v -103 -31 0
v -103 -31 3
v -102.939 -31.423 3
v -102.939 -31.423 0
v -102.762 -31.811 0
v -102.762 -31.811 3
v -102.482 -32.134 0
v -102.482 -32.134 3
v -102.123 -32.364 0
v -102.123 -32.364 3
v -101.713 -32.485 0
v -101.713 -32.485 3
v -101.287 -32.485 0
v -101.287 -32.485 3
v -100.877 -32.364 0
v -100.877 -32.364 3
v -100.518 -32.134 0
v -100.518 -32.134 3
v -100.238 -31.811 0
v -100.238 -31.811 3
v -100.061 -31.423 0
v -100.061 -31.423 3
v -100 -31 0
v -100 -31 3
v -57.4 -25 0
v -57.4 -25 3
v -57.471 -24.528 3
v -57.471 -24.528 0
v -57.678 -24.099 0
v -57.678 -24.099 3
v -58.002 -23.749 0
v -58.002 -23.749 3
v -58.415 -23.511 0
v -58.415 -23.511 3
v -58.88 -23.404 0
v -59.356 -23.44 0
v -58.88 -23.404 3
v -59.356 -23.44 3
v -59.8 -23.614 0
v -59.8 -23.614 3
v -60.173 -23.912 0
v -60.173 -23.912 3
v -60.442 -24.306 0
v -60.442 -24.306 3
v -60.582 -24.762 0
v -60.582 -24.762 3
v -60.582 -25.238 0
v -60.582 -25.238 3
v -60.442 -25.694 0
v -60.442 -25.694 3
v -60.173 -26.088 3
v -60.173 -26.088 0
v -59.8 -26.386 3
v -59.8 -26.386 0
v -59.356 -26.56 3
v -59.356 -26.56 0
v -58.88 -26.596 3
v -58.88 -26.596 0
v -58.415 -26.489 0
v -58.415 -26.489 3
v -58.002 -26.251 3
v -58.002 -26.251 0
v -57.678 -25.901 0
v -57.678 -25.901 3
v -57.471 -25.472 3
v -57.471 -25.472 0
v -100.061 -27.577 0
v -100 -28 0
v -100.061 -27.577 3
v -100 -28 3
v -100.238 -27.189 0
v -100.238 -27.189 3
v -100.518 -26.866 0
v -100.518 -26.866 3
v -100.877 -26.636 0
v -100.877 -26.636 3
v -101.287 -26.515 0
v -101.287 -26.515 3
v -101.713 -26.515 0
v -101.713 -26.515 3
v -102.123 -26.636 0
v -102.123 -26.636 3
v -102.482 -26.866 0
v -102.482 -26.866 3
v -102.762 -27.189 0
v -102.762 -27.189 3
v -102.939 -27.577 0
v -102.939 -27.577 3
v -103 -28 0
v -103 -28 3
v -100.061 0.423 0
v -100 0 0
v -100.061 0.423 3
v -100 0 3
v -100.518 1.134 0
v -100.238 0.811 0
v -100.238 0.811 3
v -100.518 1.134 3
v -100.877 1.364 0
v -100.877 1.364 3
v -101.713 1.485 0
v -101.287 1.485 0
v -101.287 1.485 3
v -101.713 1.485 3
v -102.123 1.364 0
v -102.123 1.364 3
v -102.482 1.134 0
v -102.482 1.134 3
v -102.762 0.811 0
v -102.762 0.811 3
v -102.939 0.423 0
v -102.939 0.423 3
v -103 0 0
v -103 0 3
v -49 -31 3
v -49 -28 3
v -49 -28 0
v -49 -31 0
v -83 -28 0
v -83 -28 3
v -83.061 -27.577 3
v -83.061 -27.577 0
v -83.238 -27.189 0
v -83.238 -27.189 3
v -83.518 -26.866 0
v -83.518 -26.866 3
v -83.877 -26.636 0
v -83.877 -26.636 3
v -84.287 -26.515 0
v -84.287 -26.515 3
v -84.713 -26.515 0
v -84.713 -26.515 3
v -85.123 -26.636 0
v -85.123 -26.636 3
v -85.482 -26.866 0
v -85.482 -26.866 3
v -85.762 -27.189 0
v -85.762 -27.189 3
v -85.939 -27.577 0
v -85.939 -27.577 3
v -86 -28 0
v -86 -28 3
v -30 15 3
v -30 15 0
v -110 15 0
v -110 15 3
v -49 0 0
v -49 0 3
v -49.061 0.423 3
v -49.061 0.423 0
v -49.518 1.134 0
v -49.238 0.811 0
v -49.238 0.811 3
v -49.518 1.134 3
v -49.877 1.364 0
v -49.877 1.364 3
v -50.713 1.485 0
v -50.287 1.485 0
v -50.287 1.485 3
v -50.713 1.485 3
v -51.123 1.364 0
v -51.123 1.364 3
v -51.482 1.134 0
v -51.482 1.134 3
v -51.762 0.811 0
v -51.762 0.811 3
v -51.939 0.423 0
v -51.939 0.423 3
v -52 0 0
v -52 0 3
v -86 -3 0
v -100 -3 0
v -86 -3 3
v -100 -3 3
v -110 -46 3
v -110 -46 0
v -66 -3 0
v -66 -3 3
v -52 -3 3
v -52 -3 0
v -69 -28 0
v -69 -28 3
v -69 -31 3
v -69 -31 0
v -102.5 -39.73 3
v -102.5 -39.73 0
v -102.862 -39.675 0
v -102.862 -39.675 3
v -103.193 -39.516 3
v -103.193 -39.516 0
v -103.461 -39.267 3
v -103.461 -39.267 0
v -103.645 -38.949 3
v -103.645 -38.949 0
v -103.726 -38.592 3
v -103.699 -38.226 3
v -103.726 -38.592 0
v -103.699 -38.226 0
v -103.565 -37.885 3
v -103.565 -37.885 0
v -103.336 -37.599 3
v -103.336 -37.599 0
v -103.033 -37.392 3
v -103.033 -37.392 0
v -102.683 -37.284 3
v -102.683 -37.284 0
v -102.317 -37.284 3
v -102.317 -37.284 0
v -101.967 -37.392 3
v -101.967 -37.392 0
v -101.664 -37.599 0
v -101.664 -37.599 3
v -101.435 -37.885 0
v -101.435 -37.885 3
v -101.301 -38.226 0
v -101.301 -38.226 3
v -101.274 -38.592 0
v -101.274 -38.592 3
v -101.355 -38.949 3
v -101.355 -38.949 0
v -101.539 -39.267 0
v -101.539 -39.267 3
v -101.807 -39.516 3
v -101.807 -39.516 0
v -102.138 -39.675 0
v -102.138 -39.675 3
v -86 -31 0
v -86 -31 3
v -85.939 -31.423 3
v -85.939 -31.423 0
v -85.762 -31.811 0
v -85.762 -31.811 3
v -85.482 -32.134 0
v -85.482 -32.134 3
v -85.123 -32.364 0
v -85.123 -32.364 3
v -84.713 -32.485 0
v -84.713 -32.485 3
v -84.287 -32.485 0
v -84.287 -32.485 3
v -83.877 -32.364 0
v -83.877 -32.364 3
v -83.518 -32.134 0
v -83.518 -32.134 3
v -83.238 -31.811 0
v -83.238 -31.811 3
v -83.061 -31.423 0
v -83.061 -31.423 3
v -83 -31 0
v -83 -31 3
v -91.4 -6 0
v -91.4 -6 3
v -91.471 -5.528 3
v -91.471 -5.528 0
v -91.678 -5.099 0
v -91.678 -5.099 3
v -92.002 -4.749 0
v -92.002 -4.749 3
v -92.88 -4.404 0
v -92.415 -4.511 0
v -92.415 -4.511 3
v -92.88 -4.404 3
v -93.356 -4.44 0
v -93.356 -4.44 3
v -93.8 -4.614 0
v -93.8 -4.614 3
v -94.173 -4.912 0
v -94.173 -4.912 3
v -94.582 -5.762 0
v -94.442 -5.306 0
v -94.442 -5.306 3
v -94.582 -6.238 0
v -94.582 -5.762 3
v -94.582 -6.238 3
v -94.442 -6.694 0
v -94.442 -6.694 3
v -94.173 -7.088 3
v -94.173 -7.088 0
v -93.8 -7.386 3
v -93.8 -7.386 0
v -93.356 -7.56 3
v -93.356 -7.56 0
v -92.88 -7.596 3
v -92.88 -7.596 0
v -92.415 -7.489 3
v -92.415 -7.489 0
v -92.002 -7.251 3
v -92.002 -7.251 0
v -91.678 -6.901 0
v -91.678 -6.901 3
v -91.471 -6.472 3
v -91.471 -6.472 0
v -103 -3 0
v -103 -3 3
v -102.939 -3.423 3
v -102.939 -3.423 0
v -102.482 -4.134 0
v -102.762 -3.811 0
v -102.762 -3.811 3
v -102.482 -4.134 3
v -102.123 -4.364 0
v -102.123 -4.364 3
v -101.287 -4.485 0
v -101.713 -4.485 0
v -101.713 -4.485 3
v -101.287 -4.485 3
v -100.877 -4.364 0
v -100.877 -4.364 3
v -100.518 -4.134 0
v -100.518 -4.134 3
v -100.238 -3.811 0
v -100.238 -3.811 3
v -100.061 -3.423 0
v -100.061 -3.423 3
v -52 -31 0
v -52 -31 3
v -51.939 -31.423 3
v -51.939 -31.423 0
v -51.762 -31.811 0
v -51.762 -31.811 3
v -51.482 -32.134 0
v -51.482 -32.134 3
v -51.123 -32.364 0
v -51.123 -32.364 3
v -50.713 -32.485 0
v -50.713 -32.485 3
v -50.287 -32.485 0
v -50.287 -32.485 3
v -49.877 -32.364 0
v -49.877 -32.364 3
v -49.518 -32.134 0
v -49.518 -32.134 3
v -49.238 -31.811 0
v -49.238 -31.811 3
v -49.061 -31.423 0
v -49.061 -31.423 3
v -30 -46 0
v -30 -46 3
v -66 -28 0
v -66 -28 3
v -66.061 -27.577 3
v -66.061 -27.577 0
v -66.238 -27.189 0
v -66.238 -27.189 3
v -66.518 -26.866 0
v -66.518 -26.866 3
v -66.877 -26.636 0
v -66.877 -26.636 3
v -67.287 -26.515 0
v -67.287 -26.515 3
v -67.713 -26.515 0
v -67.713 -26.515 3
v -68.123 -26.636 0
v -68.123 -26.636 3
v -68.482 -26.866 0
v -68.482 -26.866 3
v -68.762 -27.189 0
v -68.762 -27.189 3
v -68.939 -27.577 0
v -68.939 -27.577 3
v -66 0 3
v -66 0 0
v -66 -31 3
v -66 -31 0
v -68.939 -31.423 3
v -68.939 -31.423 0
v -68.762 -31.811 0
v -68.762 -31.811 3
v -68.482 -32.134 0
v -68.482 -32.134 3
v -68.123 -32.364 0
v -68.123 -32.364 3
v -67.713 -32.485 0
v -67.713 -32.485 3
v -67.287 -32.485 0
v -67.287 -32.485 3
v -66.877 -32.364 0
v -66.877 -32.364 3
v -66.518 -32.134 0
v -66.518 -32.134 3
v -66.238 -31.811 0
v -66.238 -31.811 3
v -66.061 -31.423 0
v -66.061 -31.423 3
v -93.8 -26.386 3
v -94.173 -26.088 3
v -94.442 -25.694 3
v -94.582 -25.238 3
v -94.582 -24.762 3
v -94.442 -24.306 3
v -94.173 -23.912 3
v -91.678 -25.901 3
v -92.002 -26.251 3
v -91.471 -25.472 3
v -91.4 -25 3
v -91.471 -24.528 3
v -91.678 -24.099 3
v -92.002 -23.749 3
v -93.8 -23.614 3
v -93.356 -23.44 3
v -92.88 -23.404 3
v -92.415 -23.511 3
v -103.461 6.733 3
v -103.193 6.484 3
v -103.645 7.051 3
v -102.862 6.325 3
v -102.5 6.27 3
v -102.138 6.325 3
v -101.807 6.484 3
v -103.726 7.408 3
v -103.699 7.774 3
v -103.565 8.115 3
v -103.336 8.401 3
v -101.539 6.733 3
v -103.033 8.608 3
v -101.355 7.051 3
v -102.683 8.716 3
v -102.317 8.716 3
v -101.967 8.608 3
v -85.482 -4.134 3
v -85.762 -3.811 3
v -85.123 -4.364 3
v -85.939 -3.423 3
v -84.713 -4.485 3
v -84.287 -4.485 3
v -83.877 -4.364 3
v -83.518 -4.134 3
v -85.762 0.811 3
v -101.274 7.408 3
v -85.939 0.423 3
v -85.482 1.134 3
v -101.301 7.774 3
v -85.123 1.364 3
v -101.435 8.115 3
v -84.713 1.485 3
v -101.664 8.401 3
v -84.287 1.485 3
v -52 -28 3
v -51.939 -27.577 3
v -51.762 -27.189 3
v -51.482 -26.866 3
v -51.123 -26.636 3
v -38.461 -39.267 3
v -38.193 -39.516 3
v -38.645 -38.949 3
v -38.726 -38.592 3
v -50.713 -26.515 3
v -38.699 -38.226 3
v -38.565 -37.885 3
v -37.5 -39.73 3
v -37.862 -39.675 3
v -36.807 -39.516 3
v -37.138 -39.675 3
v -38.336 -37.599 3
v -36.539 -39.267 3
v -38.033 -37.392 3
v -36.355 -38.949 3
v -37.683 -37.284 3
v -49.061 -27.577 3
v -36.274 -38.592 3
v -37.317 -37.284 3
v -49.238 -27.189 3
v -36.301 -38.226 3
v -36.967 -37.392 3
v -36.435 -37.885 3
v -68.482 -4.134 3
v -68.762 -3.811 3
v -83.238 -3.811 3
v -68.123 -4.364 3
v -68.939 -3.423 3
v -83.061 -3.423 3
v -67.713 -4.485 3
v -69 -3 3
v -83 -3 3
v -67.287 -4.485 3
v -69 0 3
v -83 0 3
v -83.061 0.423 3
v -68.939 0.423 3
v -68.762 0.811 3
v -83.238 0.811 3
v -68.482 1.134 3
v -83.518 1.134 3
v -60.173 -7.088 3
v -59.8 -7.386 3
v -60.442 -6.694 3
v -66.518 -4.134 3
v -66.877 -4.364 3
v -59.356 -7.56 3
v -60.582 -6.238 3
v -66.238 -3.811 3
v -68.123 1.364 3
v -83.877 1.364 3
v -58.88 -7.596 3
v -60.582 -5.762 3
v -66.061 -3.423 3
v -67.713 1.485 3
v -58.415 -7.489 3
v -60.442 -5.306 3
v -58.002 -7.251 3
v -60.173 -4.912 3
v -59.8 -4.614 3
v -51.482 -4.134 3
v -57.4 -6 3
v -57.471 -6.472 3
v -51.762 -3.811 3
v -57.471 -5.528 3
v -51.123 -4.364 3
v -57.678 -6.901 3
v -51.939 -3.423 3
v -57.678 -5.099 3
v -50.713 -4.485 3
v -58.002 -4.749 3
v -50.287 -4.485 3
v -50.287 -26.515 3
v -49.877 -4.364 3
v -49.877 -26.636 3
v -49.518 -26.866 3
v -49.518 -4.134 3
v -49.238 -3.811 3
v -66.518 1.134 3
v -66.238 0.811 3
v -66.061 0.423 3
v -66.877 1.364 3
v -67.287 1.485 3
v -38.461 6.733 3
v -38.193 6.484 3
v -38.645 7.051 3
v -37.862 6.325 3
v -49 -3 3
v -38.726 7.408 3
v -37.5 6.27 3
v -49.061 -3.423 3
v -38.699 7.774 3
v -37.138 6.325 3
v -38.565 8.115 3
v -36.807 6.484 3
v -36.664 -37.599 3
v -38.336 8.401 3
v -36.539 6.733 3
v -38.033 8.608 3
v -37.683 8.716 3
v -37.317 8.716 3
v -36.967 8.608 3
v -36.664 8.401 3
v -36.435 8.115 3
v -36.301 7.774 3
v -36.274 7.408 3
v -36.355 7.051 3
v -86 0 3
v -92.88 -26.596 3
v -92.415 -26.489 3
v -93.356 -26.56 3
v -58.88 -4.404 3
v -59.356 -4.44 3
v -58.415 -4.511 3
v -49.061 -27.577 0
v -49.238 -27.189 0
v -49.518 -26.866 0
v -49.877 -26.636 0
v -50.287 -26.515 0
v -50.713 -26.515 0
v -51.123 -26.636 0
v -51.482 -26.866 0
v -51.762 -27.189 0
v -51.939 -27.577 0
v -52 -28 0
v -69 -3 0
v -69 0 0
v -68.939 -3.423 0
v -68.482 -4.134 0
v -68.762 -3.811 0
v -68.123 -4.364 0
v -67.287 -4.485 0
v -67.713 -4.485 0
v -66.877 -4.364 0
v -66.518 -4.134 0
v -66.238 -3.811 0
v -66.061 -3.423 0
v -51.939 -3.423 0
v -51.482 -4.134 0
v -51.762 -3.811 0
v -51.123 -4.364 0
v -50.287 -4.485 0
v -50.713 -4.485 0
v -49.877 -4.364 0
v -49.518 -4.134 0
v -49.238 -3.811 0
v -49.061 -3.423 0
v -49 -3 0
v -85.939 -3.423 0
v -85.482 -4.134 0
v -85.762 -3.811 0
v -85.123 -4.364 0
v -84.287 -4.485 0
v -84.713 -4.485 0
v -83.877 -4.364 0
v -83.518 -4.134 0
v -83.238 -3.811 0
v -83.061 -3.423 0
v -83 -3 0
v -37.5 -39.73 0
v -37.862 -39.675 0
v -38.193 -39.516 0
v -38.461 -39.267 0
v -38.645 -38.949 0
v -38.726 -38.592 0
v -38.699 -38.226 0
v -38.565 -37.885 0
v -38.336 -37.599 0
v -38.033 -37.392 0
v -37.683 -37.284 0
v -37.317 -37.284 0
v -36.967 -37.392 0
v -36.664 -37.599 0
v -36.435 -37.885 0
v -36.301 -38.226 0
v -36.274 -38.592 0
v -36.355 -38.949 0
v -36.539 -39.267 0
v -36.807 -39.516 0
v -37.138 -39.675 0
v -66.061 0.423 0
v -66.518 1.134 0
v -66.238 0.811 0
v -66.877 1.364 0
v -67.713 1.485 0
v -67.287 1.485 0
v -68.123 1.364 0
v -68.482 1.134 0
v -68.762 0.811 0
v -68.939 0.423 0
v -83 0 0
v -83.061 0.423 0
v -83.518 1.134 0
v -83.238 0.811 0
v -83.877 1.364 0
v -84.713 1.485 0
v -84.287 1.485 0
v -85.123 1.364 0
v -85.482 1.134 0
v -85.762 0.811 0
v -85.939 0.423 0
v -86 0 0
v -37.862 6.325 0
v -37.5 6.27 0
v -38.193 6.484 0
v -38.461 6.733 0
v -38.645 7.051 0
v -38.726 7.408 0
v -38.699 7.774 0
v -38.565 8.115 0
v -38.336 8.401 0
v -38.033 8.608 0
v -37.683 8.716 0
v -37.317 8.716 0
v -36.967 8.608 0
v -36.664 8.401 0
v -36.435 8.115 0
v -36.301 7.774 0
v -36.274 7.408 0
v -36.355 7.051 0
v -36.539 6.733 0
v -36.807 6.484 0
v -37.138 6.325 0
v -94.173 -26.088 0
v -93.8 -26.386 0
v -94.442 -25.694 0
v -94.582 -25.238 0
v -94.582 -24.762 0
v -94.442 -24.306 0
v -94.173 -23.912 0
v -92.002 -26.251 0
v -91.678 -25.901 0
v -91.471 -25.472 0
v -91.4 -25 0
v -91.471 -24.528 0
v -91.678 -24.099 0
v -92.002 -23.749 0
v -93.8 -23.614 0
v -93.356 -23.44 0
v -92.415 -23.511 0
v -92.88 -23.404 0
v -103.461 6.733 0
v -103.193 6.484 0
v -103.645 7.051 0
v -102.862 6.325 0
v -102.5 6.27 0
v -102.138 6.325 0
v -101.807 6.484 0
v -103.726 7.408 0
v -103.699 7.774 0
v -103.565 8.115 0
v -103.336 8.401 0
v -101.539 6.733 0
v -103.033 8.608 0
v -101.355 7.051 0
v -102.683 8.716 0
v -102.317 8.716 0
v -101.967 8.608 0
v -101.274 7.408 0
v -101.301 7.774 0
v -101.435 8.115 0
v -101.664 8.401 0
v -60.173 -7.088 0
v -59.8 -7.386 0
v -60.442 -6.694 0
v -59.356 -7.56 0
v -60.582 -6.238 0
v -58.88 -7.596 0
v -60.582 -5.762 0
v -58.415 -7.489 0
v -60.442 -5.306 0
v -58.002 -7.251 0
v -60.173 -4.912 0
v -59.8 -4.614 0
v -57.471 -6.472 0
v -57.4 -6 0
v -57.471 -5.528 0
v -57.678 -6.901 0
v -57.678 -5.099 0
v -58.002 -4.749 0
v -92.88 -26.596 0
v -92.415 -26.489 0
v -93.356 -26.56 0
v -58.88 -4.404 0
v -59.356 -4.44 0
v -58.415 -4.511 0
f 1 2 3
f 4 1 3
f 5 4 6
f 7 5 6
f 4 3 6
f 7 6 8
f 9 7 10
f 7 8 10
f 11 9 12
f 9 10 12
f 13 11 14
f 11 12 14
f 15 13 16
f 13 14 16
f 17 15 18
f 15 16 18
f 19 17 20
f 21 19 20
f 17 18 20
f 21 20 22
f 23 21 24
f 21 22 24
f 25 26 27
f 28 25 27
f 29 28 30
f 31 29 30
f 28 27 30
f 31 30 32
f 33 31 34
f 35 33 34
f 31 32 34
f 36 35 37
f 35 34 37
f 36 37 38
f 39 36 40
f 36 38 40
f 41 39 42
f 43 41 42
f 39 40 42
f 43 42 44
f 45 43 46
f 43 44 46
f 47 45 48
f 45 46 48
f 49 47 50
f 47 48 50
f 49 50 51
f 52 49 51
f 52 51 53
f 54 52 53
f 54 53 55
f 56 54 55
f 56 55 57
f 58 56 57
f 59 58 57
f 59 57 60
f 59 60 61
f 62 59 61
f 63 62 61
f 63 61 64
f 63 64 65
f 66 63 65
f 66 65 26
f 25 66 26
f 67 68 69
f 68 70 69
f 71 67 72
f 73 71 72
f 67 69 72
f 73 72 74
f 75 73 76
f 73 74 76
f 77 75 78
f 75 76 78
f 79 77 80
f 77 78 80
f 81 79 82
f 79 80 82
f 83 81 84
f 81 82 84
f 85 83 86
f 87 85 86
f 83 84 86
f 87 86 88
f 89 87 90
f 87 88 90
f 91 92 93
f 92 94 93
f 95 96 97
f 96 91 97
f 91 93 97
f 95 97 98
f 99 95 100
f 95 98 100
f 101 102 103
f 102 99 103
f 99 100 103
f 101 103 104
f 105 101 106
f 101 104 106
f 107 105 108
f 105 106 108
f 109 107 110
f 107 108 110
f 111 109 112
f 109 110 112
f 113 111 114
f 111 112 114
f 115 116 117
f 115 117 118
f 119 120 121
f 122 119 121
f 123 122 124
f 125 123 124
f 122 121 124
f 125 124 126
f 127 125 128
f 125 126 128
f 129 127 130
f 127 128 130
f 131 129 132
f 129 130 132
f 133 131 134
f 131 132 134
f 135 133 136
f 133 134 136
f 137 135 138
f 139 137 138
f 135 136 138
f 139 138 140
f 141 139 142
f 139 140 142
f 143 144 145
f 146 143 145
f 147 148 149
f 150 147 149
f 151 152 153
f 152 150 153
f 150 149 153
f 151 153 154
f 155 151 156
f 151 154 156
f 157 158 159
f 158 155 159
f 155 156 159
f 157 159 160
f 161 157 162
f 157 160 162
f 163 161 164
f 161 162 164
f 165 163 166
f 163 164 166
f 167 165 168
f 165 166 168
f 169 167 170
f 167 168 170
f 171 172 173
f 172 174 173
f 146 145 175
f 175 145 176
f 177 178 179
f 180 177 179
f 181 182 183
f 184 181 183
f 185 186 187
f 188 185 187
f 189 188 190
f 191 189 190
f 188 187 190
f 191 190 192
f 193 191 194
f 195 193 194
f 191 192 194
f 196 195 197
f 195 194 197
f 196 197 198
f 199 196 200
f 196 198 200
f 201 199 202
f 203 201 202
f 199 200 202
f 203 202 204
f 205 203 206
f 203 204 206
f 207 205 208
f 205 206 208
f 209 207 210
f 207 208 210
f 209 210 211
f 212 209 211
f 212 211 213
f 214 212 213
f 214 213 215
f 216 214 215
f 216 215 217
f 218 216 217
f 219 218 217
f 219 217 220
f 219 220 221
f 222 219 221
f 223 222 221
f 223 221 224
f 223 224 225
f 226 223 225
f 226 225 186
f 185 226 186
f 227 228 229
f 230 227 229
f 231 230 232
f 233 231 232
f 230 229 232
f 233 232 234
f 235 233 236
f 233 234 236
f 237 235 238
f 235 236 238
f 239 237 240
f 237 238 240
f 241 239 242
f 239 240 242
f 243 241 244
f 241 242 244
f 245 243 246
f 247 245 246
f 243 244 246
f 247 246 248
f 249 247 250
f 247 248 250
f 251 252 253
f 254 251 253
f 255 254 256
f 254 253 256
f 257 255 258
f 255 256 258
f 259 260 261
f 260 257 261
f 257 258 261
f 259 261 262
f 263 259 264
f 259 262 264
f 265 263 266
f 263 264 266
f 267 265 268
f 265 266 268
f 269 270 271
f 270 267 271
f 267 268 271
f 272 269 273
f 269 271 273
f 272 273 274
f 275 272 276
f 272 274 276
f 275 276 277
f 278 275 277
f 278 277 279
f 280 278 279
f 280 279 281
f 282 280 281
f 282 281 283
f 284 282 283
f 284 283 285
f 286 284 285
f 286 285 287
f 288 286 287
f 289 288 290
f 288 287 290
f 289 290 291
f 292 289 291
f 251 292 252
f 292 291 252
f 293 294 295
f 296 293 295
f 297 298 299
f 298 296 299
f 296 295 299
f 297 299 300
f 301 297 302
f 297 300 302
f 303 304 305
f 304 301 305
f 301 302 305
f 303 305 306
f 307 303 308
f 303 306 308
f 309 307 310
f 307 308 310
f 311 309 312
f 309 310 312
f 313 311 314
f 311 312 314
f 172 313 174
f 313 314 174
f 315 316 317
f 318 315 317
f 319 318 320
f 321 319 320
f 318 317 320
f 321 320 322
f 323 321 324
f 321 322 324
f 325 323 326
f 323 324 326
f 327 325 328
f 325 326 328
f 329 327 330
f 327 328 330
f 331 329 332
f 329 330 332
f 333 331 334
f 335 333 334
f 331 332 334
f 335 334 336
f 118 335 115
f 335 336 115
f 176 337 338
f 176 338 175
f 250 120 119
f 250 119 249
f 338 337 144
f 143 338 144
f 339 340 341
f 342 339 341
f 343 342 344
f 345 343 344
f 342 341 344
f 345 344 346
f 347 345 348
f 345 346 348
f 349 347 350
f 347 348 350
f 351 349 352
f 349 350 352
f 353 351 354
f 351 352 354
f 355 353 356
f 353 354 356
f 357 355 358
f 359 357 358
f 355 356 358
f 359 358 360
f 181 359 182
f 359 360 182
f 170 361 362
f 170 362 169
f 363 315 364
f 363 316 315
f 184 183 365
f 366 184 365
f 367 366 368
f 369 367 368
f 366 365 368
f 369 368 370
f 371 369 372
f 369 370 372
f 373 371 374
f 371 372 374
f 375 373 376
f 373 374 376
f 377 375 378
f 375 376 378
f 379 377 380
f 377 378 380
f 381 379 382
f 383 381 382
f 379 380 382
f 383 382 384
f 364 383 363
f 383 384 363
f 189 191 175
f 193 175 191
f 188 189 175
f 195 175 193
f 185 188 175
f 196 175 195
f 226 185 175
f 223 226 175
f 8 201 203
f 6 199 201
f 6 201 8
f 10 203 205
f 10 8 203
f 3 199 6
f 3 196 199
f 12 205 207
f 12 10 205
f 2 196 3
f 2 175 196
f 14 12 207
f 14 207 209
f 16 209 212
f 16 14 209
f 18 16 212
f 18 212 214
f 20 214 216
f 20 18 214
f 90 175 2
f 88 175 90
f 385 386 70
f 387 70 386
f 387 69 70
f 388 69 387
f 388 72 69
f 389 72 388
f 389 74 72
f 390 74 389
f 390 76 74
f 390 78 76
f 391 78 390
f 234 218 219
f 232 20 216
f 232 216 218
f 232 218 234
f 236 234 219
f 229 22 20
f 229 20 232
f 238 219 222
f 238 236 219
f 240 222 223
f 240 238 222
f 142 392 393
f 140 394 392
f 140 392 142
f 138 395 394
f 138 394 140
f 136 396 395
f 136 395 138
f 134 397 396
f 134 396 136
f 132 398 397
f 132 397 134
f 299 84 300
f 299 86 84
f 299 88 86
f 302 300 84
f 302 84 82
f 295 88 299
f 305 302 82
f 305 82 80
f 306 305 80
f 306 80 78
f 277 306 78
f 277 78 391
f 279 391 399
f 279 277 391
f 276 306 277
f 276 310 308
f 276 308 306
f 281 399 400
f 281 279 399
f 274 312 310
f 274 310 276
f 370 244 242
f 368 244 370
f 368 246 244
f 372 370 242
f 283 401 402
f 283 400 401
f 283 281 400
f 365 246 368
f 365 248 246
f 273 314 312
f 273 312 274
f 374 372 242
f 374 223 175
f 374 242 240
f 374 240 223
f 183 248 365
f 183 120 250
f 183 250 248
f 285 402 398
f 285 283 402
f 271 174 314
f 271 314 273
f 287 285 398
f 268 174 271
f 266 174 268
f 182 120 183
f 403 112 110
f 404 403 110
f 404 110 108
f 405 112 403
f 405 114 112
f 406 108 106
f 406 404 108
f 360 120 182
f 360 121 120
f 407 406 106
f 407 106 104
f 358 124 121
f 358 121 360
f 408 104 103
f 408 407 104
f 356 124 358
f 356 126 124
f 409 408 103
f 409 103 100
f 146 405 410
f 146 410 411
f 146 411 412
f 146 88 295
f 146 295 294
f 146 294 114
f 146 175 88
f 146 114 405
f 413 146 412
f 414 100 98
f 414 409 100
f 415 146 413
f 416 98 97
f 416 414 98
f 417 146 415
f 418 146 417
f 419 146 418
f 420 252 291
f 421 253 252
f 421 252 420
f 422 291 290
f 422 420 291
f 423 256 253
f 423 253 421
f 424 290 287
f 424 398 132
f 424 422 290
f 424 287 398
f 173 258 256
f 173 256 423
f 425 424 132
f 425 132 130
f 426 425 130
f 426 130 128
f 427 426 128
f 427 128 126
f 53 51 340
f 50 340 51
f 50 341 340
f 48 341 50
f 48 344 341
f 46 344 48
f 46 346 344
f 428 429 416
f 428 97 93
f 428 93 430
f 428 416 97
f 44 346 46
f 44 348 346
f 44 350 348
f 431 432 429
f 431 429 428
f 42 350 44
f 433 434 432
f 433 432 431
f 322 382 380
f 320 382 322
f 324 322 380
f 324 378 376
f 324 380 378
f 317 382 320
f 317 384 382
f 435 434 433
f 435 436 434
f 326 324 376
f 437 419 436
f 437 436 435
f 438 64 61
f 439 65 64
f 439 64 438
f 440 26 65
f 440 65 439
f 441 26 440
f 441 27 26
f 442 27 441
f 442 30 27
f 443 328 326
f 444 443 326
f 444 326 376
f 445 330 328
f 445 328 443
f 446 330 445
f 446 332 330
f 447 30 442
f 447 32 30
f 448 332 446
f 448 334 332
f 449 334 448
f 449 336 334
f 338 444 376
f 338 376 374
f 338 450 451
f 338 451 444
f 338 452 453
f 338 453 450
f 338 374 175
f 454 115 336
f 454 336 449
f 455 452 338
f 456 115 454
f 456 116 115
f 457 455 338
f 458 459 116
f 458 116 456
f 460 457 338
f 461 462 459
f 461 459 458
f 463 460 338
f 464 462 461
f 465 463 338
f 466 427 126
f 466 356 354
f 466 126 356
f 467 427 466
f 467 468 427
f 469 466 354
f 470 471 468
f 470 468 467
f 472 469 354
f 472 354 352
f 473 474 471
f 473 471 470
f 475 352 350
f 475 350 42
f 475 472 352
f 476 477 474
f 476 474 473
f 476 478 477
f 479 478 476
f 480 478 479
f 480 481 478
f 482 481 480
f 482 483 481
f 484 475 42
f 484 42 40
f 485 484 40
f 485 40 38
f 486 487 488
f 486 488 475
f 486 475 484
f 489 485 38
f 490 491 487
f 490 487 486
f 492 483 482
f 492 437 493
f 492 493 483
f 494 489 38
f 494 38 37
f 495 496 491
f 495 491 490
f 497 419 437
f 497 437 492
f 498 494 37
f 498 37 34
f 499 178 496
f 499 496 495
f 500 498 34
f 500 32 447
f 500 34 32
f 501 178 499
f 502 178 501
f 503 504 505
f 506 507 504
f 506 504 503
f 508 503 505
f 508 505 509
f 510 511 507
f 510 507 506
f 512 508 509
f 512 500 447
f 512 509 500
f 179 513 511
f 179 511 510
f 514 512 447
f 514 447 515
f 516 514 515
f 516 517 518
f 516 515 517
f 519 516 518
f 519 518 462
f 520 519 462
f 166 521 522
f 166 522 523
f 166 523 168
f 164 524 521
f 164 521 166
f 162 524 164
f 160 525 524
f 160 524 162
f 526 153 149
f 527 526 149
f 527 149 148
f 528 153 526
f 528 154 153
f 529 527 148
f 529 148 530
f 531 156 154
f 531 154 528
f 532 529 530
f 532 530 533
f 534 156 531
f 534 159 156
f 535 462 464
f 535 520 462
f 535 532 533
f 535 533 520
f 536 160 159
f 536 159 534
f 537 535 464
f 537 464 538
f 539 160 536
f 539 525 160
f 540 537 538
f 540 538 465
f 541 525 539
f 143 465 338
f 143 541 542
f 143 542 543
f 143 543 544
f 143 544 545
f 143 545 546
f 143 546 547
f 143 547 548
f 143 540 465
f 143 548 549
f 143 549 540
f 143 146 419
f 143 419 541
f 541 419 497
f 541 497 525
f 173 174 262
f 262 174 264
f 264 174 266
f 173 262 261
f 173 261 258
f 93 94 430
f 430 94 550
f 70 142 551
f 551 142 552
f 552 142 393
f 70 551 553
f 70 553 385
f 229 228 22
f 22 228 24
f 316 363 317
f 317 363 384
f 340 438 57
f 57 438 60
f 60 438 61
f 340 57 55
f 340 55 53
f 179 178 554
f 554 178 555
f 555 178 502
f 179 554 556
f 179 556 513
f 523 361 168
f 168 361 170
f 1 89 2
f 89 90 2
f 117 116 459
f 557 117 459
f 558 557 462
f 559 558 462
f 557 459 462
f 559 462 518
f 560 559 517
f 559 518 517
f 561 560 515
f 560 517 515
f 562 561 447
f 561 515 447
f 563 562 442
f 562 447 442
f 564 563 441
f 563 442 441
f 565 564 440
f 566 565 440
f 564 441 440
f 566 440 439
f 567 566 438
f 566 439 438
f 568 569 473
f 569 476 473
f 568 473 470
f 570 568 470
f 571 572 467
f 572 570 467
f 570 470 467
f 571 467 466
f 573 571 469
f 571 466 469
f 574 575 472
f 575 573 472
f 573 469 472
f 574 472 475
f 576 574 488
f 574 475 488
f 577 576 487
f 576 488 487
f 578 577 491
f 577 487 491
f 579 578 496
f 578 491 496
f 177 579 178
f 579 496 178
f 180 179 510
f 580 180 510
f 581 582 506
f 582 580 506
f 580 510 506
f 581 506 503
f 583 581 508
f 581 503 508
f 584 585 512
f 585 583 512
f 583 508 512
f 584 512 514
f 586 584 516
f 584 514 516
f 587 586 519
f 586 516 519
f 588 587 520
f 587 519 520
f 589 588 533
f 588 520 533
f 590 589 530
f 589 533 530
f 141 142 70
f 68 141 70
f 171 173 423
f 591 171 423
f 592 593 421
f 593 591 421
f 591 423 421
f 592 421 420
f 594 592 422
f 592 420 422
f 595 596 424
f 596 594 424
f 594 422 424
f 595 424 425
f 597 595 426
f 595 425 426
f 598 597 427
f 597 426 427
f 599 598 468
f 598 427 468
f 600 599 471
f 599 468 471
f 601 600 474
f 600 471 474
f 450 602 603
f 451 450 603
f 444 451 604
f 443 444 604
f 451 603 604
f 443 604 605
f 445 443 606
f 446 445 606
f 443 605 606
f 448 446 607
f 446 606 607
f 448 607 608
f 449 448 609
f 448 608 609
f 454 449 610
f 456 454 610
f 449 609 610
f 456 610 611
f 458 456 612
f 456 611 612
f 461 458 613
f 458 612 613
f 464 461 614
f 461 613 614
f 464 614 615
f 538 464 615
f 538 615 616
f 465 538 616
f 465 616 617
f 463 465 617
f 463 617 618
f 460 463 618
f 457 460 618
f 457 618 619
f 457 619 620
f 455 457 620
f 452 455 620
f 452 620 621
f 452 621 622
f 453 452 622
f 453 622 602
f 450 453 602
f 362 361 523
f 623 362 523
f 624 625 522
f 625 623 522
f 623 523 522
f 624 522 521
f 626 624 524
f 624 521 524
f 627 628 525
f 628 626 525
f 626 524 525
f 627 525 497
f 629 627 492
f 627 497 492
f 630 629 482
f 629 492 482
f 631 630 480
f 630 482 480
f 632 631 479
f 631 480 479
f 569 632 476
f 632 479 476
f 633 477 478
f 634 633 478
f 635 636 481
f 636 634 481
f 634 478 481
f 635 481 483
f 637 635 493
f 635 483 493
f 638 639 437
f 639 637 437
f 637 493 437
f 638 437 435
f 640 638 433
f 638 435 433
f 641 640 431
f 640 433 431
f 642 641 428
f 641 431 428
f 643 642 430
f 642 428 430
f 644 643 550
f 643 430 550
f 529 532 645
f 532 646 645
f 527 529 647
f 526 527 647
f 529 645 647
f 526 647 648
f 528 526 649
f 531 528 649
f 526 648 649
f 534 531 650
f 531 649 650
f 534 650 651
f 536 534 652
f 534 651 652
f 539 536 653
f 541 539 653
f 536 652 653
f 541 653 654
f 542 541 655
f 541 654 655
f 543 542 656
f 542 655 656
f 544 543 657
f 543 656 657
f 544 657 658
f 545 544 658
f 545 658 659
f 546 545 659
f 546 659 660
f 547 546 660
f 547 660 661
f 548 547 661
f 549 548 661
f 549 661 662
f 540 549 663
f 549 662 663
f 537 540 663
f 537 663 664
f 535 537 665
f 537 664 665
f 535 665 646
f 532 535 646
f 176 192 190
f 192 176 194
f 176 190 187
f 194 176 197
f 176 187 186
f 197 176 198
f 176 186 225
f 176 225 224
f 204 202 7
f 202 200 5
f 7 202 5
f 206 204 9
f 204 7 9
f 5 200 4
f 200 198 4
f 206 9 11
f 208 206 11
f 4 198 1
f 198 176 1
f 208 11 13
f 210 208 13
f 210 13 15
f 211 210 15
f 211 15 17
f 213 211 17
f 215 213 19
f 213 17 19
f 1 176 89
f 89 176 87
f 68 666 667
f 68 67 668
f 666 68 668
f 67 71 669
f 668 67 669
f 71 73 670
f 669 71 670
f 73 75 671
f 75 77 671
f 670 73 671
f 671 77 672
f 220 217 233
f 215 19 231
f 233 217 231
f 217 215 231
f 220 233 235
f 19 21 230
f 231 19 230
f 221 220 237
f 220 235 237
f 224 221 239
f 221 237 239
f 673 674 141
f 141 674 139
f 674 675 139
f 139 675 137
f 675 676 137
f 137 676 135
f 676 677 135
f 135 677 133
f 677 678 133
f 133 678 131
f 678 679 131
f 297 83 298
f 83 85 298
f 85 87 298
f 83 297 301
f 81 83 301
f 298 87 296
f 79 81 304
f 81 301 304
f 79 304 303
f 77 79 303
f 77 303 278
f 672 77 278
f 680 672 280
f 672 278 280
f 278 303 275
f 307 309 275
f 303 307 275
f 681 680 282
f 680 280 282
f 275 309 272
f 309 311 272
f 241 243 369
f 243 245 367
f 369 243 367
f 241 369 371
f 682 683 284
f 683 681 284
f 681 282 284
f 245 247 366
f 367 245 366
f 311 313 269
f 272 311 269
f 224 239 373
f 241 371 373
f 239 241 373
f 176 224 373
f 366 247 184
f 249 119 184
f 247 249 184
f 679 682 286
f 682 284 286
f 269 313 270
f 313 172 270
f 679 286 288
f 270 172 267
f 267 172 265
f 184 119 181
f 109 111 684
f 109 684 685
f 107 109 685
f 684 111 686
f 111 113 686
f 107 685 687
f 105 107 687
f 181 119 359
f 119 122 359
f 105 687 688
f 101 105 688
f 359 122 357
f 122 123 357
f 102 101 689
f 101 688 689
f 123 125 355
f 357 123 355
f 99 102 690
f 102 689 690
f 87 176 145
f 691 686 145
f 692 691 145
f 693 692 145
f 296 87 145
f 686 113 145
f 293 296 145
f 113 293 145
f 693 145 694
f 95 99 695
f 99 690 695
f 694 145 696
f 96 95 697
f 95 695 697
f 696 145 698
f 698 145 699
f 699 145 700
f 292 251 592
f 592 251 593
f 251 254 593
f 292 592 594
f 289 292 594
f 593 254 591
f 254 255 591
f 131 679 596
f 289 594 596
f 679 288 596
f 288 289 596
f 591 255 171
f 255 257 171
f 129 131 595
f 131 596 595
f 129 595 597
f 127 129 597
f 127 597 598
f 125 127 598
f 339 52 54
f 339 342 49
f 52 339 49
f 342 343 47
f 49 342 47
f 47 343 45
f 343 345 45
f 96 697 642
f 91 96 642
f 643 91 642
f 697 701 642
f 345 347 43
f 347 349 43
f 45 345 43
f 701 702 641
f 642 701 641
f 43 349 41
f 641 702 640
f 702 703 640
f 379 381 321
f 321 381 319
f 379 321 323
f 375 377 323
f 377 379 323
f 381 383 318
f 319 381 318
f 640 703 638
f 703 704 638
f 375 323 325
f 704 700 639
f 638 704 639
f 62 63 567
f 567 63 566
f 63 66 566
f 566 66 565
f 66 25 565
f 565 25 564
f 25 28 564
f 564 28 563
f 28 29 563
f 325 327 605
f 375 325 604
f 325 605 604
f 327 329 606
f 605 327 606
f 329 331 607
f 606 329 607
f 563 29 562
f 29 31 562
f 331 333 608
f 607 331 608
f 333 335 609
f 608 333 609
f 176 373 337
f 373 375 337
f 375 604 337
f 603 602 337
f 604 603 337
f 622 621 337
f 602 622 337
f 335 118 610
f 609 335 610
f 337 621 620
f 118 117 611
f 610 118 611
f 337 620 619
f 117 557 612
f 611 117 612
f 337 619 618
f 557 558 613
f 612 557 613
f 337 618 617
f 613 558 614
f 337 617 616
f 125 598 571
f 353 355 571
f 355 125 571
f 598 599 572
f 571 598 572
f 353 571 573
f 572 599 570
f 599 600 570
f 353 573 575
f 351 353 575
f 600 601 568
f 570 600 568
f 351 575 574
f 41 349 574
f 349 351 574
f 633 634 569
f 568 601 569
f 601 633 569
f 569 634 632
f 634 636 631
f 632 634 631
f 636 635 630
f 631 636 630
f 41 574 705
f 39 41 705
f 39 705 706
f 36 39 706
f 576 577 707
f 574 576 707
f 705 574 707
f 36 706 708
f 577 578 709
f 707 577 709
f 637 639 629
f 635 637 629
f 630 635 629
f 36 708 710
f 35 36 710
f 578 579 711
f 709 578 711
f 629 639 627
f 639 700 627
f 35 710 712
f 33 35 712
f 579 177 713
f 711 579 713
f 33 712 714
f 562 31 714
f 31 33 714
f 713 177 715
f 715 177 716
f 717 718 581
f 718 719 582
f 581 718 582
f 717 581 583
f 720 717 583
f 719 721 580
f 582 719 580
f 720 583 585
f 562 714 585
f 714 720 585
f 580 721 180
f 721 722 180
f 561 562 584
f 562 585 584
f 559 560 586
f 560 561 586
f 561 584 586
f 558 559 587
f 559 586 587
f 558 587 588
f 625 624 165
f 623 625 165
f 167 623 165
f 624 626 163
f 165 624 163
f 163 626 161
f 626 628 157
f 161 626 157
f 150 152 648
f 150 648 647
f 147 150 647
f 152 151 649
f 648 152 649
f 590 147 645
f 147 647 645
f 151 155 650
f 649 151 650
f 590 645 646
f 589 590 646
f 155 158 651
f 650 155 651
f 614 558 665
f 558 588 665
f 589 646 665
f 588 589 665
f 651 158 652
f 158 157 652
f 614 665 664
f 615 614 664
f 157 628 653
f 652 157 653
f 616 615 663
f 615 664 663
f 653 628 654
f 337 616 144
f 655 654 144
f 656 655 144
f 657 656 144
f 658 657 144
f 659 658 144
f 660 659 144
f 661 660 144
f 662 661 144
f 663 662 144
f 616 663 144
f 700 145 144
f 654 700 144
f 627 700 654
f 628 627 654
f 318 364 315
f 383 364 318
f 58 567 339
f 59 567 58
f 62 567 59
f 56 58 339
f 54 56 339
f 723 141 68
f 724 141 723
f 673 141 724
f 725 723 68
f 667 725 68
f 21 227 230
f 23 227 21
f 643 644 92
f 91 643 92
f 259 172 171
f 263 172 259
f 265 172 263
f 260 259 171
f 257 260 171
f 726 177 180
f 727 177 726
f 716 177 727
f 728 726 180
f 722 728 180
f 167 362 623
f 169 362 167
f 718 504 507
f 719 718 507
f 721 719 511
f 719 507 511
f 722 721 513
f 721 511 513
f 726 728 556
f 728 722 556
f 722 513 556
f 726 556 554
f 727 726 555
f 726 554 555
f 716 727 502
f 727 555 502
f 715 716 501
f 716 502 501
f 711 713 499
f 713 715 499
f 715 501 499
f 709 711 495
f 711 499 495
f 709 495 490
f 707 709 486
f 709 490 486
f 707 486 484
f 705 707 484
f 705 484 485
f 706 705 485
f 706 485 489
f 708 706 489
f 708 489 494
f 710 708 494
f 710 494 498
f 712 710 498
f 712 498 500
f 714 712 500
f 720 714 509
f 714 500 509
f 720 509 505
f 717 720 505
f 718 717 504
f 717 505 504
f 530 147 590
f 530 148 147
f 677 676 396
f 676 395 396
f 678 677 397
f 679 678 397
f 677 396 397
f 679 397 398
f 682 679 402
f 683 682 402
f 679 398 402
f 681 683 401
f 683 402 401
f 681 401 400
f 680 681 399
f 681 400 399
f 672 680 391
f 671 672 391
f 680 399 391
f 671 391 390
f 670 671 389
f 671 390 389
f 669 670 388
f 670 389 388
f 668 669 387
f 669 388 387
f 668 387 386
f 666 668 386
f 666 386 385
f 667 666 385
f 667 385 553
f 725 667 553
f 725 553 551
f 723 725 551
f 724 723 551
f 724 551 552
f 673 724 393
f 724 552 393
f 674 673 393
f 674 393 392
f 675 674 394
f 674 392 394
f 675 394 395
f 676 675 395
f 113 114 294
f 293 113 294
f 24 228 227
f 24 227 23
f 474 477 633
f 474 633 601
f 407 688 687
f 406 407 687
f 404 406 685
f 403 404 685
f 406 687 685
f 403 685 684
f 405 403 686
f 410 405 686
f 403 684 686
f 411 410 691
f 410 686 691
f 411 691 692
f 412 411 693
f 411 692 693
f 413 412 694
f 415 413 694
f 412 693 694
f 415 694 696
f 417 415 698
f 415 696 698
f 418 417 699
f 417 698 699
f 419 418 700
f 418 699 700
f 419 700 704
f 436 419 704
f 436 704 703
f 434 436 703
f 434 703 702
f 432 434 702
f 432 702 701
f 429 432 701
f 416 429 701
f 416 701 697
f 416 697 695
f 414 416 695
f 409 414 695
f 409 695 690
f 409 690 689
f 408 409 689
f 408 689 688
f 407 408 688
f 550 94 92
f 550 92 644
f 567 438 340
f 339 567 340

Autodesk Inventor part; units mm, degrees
ref_plane "YZ Plane" through (0, 0, 0) normal (1, 0, 0) x (0, 1, 0)
ref_plane "XZ Plane" through (0, 0, 0) normal (0, 1, 0) x (-1, 0, 0)
ref_plane "XY Plane" through (0, 0, 0) normal (0, 0, 1) x (1, 0, 0)
sketch "スケッチ1" plane through (0, 0, 0) normal (0, 0, 1) x (1, 0, 0)
  line L0 (0, -31) -> (0, -46) projected
  line L1 (0, -31) -> (-140, -31) projected
  line L2 (-140, -46) -> (-140, -31) projected
  line L3 (0, -46) -> (-140, -46) projected
  line L4 (-30, 15) -> (-110, 15)
  line L5 (-110, 15) -> (-110, -46)
  line L6 (-110, -46) -> (-30, -46)
  line L7 (-30, -46) -> (-30, 15)
  line L8 (0, 15) -> (0, 0) projected
  line L9 (0, 15) -> (-140, 15) projected
  line L10 (-140, 0) -> (-140, 15) projected
  line L11 (0, 0) -> (-140, 0) projected
  circle A0 centre (-37.5, 7.5) radius 1.6 projected
  circle A1 centre (-102.5, 7.5) radius 1.6 projected
  circle A2 centre (-37.5, -38.5) radius 1.6 projected
  circle A3 centre (-102.5, -38.5) radius 1.6 projected
  dimension "d1" = 80
  dimension "d15" = 30
extrude "押し出し1" add sketch "スケッチ1" along normal blind 3 contours L7 L3 L5 L1 | L1 L5 L11 L7 | L11 L5 L4 L7 | A0 | A1 | A2 | A3
sketch "スケッチ2" plane through (0, 0, 3) normal (0, 0, 1) x (1, 0, 0)
  line L0 (-110, -46) -> (-30, -46) projected
  line L1 (-30, 15) -> (-110, 15) projected
  line L2 (-30, -46) -> (-30, 15) projected
  line L3 (-110, 15) -> (-110, -46) projected
  point P0 (0, 0)
  point P1 (-37.5, 7.5)
  point P2 (-37.5, -38.5)
  point P3 (-102.5, -38.5)
  point P4 (-102.5, 7.5)
  dimension "d4" = 7.5
  dimension "d5" = 7.5
  dimension "d6" = 7.5
  dimension "d7" = 7.5
hole "穴1" at (-37.5, 7.5, 3) at (-37.5, -38.5, 3) at (-102.5, -38.5, 3) at (-102.5, 7.5, 3) direction (0, 0, -1) diameter 2.459 end through all thread size "M3x0.5" class "6H" standard "ISO Metric profile"
sketch "スケッチ3" plane through (0, 0, 3) normal (0, 0, 1) x (1, 0, 0)
  line L0 (-52, -28) -> (-66, -28)
  line L1 (-69, -28) -> (-69, -31)
  line L2 (-52, -31) -> (-66, -31)
  line L3 (-49, -28) -> (-49, -31)
  line L4 (-30, -46) -> (-30, 15) projected
  line L5 (-110, -46) -> (-30, -46) projected
  arc A0 (-69, -31) -> (-66, -31) centre (-67.5, -31) ccw
  arc A1 (-52, -31) -> (-49, -31) centre (-50.5, -31) ccw
  arc A2 (-66, -28) -> (-69, -28) centre (-67.5, -28) ccw
  arc A3 (-49, -28) -> (-52, -28) centre (-50.5, -28) ccw
  circle A4 centre (-59, -25) radius 1.6
  point P0 (0, 0)
  point P1 (-59, -28)
  dimension "d16" = 19
  dimension "d17" = 15
  dimension "d18" = 3
  dimension "d19" = 20
  dimension "d21" = 3
  dimension "d32" = 3
  dimension "d33" = 3.2
extrude "押し出し2" cut sketch "スケッチ3" against normal blind 3
ref_plane "作業平面1" through (-110, -15.5, 0) normal (0, 1, 0) x (1, 0, 0)
mirror "ミラー1" about plane through (-110, -15.5, 0) normal (0, 1, 0) of "押し出し2"
pattern_linear "矩形状パターン1" count 2 spacing 34 along (-1, 0, 0) of "押し出し2", "ミラー1"
equation "\"d5\" = d4"
properties part number "plate2" material "アルミニウム 2014-T4"
